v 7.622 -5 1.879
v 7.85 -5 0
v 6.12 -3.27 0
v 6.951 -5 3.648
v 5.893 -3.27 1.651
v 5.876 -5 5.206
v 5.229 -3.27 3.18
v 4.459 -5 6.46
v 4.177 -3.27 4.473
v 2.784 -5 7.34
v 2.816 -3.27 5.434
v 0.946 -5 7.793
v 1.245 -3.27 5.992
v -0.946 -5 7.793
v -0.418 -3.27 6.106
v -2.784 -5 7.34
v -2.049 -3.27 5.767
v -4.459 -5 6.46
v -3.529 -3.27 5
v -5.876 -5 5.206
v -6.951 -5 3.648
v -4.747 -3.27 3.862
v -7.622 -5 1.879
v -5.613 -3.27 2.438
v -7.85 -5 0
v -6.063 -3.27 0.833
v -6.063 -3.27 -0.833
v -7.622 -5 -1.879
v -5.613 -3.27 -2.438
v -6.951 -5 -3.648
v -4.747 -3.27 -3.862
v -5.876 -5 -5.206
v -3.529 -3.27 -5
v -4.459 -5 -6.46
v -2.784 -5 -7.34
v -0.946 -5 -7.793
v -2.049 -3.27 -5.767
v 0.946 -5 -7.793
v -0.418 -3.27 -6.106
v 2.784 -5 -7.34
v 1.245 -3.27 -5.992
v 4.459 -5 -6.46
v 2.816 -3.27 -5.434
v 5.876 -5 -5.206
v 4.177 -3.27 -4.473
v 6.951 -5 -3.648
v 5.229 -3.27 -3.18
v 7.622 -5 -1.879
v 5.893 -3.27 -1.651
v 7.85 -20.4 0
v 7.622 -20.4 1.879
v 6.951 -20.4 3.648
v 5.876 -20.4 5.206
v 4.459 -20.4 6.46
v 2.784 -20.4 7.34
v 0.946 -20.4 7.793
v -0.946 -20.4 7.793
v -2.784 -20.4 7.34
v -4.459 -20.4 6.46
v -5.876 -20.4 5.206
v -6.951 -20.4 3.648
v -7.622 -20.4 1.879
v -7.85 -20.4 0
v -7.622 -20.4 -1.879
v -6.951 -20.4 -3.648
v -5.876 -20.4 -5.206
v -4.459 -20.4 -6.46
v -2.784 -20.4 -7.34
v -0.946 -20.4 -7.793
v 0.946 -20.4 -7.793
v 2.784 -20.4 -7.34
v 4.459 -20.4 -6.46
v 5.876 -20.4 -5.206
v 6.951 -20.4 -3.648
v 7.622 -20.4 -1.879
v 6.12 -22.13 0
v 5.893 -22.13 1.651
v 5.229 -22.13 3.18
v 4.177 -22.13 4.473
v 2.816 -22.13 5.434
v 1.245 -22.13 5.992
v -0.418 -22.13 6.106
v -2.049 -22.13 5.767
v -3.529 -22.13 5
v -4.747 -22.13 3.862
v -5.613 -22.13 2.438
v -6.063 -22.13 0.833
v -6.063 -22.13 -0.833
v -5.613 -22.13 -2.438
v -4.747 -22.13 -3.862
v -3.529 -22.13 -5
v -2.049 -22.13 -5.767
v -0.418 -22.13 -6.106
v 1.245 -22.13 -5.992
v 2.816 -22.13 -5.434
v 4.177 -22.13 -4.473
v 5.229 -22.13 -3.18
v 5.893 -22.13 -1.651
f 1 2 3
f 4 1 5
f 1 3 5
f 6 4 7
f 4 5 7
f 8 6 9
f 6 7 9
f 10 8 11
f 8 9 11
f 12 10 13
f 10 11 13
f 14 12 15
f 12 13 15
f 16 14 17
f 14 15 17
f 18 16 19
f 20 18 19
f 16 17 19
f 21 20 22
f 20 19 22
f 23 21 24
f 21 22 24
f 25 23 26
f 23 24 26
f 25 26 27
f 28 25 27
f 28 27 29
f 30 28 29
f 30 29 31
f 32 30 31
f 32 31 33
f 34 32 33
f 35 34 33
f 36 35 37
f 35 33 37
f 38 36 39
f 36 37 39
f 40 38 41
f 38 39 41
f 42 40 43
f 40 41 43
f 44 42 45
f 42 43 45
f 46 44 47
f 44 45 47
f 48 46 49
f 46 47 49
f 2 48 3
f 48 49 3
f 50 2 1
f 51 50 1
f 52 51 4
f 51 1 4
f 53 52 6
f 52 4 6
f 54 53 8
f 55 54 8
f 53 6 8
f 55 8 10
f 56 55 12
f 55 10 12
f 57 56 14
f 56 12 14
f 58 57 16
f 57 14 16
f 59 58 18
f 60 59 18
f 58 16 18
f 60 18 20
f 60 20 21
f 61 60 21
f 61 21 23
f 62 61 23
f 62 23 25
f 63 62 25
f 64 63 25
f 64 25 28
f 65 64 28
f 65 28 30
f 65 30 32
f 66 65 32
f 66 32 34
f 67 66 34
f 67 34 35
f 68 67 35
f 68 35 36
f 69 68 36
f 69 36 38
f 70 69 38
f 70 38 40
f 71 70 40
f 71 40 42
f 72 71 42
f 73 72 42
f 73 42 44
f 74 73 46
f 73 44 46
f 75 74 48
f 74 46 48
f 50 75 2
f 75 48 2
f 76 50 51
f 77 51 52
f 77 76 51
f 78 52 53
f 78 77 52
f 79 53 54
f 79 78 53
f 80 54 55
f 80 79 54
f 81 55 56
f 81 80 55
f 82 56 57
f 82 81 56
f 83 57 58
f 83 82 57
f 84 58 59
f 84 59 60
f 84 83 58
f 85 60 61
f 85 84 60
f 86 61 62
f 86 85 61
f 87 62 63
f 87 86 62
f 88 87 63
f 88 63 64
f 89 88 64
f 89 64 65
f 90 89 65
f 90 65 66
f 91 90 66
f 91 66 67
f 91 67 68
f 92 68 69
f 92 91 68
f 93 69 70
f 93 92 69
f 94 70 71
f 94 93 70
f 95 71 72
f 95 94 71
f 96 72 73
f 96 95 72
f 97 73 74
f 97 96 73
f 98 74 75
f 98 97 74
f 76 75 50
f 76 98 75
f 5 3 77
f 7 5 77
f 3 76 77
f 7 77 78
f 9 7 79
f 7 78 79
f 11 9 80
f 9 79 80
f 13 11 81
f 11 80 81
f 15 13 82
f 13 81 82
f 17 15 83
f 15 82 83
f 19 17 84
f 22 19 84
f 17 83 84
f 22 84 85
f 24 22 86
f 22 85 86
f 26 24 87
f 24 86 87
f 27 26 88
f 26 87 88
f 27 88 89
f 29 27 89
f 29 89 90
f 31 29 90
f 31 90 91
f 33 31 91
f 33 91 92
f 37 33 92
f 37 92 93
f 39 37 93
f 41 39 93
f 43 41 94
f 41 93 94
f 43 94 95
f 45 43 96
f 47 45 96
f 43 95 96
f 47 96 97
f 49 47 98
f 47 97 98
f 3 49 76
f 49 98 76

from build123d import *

# Parameters (mm, degrees)
F0_R     = 7.85
F1_DEPTH = 25.4
F3_D     = 12.24


# Not quite as in the source:
# - a fillet or chamfer that OpenCascade refuses, or shapes differently, is made with other operations: its cross-section is extruded or revolved along the edge and cut away or added


with BuildPart() as f1:
    # F0 (on Front) → F1 (new body)
    with BuildSketch(Plane.XZ):
        Circle(F0_R)
    extrude(amount=F1_DEPTH)

    # F3 (through all)
    with Locations(Plane(origin=(0, 0, 0), x_dir=(-1, 0, 0), z_dir=(0, 1, 0))):
        with Locations((0, 0)):
            Hole(F3_D / 2)

    # F4: chamfer of 5 on 1 edges, made by hand

    # F4_s1 → F4_t2 (revolve, cut)
    with BuildSketch(Plane.XY):
        Polygon((7.85, -5), (2.85, 0), (7.85, 0), align=None)
    revolve(axis=Axis((0, 0, 0), (0, -1, 0)), mode=Mode.SUBTRACT)

    # F5: chamfer of 5 on 1 edges, made by hand

    # F5_s1 → F5_t2 (revolve, cut)
    with BuildSketch(Plane.XY):
        Polygon((7.85, -20.4), (2.85, -25.4), (7.85, -25.4), align=None)
    revolve(axis=Axis((0, -25.4, 0), (0, -1, 0)), mode=Mode.SUBTRACT)


solid = f1.part
